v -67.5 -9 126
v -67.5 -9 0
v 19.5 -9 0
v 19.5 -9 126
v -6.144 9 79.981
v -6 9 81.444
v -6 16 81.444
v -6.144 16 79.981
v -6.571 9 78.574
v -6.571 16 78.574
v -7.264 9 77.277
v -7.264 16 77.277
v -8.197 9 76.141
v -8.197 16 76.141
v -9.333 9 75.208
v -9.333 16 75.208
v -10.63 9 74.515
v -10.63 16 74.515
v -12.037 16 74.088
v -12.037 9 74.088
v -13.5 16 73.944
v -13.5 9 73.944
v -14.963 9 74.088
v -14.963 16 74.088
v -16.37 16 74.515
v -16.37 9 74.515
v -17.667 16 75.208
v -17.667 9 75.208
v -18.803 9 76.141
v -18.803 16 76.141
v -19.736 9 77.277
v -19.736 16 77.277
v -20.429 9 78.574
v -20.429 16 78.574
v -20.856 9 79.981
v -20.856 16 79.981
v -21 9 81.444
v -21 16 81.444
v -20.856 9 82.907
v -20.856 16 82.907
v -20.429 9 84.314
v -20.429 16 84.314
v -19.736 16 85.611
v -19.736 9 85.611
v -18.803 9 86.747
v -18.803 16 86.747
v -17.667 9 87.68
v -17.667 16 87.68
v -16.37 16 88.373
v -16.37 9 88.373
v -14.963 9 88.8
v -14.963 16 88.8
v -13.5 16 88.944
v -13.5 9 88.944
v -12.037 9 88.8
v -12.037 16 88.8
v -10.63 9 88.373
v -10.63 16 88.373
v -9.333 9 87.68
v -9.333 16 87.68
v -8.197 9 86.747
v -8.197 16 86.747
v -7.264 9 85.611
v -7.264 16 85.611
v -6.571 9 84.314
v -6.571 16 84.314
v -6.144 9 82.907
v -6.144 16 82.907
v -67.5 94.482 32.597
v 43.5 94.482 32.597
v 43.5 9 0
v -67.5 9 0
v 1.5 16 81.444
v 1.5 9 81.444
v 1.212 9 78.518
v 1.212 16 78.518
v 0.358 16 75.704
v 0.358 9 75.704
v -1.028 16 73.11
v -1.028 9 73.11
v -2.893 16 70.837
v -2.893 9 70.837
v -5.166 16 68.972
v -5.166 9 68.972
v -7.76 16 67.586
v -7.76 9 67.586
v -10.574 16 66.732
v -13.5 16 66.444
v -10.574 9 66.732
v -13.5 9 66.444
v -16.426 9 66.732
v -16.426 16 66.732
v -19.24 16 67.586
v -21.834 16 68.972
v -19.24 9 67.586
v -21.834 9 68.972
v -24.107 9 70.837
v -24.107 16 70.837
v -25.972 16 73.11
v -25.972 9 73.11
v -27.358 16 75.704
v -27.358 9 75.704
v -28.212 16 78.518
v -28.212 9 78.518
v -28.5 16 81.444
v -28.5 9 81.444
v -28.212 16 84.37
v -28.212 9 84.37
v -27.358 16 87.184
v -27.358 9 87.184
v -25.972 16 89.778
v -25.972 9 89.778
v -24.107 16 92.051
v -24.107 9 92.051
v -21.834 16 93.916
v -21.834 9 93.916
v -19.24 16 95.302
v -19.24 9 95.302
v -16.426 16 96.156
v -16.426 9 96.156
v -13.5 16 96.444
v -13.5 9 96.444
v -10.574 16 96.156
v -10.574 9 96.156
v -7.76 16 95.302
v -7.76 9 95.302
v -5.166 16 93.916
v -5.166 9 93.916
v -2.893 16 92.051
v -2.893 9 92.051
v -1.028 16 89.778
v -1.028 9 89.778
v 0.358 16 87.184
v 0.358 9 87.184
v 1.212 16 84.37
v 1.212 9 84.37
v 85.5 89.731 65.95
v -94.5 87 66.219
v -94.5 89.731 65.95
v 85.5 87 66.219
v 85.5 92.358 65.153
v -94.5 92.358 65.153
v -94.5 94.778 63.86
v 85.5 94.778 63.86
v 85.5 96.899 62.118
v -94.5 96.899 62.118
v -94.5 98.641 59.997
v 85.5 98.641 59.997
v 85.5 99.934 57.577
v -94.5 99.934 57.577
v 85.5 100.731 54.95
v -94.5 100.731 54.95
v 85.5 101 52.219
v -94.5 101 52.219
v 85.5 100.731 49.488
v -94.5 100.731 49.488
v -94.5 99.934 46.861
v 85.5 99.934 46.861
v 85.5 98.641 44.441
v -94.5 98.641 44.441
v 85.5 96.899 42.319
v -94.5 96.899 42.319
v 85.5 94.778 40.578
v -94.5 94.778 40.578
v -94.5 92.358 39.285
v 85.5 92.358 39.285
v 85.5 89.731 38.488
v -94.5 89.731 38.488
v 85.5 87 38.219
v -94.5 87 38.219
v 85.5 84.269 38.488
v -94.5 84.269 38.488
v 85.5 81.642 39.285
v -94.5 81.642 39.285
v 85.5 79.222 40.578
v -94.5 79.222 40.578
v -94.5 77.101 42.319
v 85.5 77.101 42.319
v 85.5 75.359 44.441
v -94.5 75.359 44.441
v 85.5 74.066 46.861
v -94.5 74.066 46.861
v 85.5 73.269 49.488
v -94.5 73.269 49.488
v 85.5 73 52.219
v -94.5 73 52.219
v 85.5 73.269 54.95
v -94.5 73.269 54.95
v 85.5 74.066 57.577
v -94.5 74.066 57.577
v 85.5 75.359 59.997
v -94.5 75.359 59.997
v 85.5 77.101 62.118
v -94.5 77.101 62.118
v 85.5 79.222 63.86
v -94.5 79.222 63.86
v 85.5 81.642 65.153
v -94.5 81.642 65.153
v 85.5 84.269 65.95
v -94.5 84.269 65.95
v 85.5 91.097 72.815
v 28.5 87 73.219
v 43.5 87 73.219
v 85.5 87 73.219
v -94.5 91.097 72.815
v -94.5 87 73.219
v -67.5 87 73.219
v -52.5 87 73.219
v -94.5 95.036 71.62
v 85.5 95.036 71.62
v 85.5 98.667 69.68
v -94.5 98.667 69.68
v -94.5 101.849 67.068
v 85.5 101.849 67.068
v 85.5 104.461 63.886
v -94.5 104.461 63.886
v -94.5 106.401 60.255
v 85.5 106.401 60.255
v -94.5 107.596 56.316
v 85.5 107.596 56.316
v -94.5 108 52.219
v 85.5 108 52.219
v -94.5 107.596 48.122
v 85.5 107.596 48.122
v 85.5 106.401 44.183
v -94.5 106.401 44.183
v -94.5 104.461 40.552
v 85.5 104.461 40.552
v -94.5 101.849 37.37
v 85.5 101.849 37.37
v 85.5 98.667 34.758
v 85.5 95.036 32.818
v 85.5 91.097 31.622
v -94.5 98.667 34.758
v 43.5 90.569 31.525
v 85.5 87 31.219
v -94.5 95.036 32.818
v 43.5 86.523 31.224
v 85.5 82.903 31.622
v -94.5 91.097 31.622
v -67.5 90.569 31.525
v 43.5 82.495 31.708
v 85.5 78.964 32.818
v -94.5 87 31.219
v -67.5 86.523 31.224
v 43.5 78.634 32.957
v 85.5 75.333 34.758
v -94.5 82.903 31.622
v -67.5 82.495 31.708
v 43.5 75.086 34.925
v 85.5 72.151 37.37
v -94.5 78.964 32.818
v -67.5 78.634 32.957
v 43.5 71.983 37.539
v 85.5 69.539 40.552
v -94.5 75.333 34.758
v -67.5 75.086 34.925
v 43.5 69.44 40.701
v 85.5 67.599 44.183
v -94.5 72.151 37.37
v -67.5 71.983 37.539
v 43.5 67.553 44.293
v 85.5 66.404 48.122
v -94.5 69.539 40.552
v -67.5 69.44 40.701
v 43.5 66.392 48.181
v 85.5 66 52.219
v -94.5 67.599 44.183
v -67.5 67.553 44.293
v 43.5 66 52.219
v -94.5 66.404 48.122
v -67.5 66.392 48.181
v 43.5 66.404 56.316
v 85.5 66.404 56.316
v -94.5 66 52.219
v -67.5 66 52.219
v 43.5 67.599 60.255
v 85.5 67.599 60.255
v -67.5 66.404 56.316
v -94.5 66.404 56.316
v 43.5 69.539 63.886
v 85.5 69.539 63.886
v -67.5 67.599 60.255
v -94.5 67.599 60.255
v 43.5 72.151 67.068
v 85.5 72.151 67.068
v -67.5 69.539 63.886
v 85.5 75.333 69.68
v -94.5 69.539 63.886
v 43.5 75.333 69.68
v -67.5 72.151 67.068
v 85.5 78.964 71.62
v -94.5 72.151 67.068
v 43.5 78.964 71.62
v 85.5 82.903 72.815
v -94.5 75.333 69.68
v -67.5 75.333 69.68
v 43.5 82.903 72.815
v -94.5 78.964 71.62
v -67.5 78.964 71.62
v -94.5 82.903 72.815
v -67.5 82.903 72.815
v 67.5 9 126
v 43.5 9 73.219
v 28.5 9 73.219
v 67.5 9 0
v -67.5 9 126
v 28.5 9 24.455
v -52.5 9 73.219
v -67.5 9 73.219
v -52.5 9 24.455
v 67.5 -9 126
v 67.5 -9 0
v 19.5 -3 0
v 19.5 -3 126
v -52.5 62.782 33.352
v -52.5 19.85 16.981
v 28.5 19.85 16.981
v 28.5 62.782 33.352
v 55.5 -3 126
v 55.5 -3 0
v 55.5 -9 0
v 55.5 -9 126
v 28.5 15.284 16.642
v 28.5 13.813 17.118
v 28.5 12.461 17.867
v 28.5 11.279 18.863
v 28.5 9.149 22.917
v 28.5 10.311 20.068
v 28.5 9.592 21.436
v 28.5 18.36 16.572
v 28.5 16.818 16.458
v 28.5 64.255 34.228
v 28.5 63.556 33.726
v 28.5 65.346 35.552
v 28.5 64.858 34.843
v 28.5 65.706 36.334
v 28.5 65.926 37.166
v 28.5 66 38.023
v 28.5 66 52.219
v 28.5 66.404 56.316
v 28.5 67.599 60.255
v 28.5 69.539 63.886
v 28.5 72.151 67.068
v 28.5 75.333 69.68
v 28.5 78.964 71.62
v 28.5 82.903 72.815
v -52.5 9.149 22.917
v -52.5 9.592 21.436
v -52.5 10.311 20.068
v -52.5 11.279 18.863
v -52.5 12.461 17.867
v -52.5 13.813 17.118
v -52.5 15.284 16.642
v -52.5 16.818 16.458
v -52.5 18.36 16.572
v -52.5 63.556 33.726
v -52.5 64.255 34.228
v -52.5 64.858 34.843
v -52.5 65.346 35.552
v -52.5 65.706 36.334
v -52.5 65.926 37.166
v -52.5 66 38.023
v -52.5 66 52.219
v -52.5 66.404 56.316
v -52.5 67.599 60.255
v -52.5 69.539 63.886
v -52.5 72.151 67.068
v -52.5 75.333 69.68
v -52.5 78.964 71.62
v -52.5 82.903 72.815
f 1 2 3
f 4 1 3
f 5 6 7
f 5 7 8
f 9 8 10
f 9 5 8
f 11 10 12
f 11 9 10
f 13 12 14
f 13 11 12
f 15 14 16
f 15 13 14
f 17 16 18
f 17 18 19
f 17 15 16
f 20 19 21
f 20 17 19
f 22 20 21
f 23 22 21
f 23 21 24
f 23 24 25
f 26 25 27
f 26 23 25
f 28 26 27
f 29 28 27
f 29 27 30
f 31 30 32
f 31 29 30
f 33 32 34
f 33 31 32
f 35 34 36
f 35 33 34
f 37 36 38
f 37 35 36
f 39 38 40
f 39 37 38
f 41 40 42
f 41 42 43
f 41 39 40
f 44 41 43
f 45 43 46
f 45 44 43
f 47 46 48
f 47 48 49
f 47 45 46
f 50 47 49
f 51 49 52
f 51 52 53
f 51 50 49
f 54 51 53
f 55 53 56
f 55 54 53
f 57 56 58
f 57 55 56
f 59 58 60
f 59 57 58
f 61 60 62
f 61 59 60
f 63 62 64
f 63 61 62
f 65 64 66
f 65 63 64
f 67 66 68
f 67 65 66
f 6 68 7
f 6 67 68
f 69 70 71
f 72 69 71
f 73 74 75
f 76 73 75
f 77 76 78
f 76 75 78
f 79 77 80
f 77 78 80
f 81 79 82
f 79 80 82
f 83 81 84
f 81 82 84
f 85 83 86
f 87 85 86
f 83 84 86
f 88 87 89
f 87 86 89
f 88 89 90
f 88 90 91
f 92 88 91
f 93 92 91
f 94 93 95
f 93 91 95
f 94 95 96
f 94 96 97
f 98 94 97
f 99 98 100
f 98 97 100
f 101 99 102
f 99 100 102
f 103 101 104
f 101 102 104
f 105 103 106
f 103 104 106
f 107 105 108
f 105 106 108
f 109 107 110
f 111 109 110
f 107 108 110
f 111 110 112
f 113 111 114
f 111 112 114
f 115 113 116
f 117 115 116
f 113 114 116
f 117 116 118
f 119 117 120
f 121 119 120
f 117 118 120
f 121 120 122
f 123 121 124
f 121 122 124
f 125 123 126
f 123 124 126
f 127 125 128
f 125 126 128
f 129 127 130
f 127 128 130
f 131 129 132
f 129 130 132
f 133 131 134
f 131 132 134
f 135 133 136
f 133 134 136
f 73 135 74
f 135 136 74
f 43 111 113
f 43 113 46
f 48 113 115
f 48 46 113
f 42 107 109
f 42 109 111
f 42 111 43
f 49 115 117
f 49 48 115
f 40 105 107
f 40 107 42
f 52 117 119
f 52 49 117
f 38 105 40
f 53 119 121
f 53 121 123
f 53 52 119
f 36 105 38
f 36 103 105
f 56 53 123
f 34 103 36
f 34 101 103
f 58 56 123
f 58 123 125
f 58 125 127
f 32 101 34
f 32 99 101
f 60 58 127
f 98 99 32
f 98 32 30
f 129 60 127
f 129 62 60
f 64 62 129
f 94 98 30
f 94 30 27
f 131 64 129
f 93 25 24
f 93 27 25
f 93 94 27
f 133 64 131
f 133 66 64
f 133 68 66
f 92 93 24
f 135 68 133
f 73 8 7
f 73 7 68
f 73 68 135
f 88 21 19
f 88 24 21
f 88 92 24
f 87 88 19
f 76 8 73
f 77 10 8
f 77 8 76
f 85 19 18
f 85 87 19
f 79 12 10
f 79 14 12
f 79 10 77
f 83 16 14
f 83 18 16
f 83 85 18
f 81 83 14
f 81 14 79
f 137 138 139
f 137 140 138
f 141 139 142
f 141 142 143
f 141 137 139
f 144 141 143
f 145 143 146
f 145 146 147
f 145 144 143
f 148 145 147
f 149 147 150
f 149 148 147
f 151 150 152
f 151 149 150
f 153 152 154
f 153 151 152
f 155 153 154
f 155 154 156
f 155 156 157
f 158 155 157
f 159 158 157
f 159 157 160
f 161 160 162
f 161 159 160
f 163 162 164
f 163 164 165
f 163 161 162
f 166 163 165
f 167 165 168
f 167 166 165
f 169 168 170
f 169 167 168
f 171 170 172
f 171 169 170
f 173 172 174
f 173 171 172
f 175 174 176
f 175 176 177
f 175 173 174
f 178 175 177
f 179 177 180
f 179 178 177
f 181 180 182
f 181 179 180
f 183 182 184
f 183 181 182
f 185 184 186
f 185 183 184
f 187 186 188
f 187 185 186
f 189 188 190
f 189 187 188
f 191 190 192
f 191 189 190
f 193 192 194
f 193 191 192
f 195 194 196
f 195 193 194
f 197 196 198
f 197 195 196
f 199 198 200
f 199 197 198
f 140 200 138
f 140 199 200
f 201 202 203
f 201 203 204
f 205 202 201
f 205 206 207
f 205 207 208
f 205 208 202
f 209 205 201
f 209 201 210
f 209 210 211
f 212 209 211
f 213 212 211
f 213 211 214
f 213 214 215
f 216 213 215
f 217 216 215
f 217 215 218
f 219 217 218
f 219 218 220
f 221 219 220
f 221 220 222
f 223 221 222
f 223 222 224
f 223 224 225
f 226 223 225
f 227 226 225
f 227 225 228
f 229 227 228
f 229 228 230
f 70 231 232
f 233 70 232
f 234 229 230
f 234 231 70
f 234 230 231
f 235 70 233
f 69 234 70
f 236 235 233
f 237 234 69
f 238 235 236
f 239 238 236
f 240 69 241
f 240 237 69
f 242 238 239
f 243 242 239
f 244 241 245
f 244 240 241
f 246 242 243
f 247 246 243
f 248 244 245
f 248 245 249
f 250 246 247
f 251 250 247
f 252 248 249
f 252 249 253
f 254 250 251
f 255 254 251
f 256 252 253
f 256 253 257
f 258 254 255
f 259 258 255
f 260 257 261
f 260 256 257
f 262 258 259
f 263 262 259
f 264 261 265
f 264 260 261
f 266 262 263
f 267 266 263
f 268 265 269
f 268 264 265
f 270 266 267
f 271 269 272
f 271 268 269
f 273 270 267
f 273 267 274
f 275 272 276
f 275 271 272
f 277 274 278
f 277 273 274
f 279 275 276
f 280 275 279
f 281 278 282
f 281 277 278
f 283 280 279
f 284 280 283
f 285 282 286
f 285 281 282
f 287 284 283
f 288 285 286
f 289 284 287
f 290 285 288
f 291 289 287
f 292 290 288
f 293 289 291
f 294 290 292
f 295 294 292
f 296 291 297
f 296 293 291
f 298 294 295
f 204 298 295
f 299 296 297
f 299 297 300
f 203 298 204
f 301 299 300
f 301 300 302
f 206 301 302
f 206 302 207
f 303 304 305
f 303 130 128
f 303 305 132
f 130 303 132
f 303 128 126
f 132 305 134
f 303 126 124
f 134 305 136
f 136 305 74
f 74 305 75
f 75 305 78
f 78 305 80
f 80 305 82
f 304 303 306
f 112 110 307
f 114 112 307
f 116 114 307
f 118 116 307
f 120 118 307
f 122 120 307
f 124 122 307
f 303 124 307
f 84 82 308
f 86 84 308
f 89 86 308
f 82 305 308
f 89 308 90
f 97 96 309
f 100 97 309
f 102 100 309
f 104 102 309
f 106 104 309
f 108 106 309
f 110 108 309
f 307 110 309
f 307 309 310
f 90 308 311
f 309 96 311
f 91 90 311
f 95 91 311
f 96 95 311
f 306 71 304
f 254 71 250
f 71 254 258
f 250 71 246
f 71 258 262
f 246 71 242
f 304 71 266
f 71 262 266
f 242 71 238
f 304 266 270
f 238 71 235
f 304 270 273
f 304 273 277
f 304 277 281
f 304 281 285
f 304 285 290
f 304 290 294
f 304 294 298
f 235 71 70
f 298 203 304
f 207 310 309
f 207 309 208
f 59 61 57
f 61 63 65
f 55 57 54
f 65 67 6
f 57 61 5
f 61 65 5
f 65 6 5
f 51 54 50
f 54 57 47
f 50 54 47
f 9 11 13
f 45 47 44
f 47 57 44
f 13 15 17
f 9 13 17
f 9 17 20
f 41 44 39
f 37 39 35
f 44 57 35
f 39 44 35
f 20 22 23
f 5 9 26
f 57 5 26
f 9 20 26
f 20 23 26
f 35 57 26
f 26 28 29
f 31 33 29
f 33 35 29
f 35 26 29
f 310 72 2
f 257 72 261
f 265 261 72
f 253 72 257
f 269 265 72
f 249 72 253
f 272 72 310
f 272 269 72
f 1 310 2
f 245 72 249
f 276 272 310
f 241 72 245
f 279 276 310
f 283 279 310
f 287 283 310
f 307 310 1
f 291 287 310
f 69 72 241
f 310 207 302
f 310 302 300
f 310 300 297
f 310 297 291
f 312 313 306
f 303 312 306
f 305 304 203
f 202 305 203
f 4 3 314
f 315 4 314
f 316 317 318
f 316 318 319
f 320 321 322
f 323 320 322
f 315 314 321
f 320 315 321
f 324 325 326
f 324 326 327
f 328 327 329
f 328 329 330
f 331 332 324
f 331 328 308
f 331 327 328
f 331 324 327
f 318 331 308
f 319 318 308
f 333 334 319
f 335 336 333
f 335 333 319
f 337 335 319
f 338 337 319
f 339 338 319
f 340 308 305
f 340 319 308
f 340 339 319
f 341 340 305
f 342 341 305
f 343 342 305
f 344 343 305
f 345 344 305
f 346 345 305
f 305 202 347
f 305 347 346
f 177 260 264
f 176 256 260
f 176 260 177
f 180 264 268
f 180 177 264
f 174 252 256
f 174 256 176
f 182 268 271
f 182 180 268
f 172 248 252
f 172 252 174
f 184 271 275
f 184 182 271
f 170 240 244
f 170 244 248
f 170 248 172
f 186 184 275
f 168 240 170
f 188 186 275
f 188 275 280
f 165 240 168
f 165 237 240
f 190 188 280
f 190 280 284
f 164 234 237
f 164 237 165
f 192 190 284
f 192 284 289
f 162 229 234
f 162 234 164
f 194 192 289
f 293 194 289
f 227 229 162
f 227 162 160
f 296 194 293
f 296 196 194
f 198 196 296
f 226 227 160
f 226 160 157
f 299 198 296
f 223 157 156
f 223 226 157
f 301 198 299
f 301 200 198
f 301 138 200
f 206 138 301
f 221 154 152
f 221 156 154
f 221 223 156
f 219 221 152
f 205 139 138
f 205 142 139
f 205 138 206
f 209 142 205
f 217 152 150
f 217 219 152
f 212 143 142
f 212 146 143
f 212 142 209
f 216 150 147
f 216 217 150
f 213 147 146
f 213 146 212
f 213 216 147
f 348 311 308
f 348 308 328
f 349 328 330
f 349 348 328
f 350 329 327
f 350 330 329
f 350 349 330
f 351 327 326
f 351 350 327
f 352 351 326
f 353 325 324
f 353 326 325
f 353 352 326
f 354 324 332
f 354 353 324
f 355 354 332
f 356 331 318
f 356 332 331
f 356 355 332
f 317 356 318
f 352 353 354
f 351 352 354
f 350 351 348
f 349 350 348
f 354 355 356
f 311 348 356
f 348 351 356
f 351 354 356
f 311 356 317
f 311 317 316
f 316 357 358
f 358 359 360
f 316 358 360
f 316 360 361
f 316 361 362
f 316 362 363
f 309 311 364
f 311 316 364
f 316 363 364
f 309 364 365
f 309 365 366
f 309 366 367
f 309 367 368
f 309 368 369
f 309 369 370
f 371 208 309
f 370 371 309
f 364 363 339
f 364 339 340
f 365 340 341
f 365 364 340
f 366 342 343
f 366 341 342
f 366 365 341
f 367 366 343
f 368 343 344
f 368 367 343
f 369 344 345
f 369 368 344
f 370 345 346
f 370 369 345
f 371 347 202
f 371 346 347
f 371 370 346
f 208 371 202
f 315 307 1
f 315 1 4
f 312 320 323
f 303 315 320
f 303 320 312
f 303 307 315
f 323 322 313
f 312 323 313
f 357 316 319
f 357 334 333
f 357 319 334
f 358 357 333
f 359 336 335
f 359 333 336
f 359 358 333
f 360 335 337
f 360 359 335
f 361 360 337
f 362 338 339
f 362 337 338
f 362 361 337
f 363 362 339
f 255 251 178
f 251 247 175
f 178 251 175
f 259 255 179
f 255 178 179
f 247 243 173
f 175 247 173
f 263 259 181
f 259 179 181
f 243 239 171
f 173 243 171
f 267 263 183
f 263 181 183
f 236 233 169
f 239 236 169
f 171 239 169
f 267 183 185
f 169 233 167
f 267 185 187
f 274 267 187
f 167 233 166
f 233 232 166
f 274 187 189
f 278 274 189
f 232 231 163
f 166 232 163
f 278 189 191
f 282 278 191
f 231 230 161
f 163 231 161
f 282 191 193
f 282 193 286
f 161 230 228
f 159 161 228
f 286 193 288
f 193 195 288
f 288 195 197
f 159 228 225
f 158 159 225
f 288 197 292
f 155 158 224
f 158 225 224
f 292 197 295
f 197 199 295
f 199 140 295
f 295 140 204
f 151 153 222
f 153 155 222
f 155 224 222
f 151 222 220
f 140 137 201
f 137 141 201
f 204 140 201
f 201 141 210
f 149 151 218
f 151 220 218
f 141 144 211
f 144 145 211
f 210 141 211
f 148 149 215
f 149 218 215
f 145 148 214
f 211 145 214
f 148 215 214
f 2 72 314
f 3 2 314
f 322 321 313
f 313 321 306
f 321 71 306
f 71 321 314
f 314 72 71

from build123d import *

# Parameters (mm, degrees)
BOSS_EXTRUDE1_DEPTH      = 126
SKETCH2_R                = 21
SKETCH2_R_2              = 14
BOSS_EXTRUDE4_DEPTH      = 27
BOSS_EXTRUDE4_DEPTH_BACK = 153
BOSS_EXTRUDE5_DEPTH      = 15
BOSS_EXTRUDE7_DEPTH      = 15
BOSS_EXTRUDE8_DEPTH      = 111
SKETCH11_R               = 15
SKETCH11_R_2             = 7.5
BOSS_EXTRUDE9_DEPTH      = 7


with BuildPart() as part:
    # Sketch1 → Boss-Extrude1 (new body)
    with BuildSketch(Plane.XY):
        Polygon((19.5, -9), (19.5, -3), (55.5, -3), (55.5, -9), (67.5, -9), (67.5, 9), (-67.5, 9), (-67.5, -9), align=None)
    extrude(amount=BOSS_EXTRUDE1_DEPTH)



with BuildPart() as body_2:
    # Sketch2 → Boss-Extrude4 (new body, two sides)
    with BuildSketch(Plane.ZY.offset(67.5)) as boss_extrude4_sk:
        with Locations((52.218982883, 87)):
            Circle(SKETCH2_R)
        with Locations((52.218982883, 87)):
            Circle(SKETCH2_R_2, mode=Mode.SUBTRACT)
    extrude(amount=BOSS_EXTRUDE4_DEPTH)
    extrude(boss_extrude4_sk.sketch, amount=-BOSS_EXTRUDE4_DEPTH_BACK)


with BuildPart() as part_1:
    add(part.part)

    add(body_2.part)  # Boss-Extrude5 merges body 2
    # Sketch3 → Boss-Extrude5 (add)
    with BuildSketch(Plane.ZY.offset(67.5)):
        with BuildLine():
            Line((73.218982883, 9), (73.218982883, 87))
            ThreePointArc((73.218982883, 87), (67.068225288, 72.150757595), (52.218982883, 66))
            Line((52.218982883, 66), (38.0233764, 66))
            ThreePointArc((38.0233764, 66), (35.18679718, 65.117501467), (33.351528761, 62.781527332))
            Line((33.351528761, 62.781527332), (16.980511395, 19.850443731))
            ThreePointArc((16.980511395, 19.850443731), (17.86746527, 12.461473248), (24.455467618, 9))
            Line((24.455467618, 9), (73.218982883, 9))
        make_face()
    extrude(amount=-BOSS_EXTRUDE5_DEPTH)

    # Sketch7 → Boss-Extrude7 (add)
    with BuildSketch(Plane.ZY.offset(-43.5)):
        with BuildLine():
            Line((73.218982883, 9), (73.218982883, 87))
            ThreePointArc((73.218982883, 87), (67.068225288, 72.150757595), (52.218982883, 66))
            Line((52.218982883, 66), (38.0233764, 66))
            ThreePointArc((38.0233764, 66), (35.18679718, 65.117501467), (33.351528761, 62.781527332))
            Line((33.351528761, 62.781527332), (16.980511395, 19.850443731))
            ThreePointArc((16.980511395, 19.850443731), (17.86746527, 12.461473248), (24.455467618, 9))
            Line((24.455467618, 9), (73.218982883, 9))
        make_face()
    extrude(amount=BOSS_EXTRUDE7_DEPTH)

    # Sketch4 → Boss-Extrude8 (add)
    with BuildSketch(Plane.ZY.offset(67.5)):
        with BuildLine():
            ThreePointArc((52.218982883, 66), (34.925476722, 75.086367277), (32.597222798, 94.482414795))
            Line((32.597222798, 94.482414795), (0, 9))
            Line((0, 9), (24.455467618, 9))
            ThreePointArc((24.455467618, 9), (17.86746527, 12.461473248), (16.980511395, 19.850443731))
            Line((16.980511395, 19.850443731), (33.351528761, 62.781527332))
            ThreePointArc((33.351528761, 62.781527332), (35.18679718, 65.117501467), (38.0233764, 66))
            Line((38.0233764, 66), (52.218982883, 66))
        make_face()
    extrude(amount=-BOSS_EXTRUDE8_DEPTH)

    # Sketch11 → Boss-Extrude9 (add)
    with BuildSketch(Plane(origin=(0, 9, 0), x_dir=(1, 0, 0), z_dir=(0, 1, 0))):
        with Locations((-13.5, -81.444044499)):
            Circle(SKETCH11_R)
        with Locations((-13.5, -81.444044499)):
            Circle(SKETCH11_R_2, mode=Mode.SUBTRACT)
    extrude(amount=BOSS_EXTRUDE9_DEPTH)


solid = part_1.part
